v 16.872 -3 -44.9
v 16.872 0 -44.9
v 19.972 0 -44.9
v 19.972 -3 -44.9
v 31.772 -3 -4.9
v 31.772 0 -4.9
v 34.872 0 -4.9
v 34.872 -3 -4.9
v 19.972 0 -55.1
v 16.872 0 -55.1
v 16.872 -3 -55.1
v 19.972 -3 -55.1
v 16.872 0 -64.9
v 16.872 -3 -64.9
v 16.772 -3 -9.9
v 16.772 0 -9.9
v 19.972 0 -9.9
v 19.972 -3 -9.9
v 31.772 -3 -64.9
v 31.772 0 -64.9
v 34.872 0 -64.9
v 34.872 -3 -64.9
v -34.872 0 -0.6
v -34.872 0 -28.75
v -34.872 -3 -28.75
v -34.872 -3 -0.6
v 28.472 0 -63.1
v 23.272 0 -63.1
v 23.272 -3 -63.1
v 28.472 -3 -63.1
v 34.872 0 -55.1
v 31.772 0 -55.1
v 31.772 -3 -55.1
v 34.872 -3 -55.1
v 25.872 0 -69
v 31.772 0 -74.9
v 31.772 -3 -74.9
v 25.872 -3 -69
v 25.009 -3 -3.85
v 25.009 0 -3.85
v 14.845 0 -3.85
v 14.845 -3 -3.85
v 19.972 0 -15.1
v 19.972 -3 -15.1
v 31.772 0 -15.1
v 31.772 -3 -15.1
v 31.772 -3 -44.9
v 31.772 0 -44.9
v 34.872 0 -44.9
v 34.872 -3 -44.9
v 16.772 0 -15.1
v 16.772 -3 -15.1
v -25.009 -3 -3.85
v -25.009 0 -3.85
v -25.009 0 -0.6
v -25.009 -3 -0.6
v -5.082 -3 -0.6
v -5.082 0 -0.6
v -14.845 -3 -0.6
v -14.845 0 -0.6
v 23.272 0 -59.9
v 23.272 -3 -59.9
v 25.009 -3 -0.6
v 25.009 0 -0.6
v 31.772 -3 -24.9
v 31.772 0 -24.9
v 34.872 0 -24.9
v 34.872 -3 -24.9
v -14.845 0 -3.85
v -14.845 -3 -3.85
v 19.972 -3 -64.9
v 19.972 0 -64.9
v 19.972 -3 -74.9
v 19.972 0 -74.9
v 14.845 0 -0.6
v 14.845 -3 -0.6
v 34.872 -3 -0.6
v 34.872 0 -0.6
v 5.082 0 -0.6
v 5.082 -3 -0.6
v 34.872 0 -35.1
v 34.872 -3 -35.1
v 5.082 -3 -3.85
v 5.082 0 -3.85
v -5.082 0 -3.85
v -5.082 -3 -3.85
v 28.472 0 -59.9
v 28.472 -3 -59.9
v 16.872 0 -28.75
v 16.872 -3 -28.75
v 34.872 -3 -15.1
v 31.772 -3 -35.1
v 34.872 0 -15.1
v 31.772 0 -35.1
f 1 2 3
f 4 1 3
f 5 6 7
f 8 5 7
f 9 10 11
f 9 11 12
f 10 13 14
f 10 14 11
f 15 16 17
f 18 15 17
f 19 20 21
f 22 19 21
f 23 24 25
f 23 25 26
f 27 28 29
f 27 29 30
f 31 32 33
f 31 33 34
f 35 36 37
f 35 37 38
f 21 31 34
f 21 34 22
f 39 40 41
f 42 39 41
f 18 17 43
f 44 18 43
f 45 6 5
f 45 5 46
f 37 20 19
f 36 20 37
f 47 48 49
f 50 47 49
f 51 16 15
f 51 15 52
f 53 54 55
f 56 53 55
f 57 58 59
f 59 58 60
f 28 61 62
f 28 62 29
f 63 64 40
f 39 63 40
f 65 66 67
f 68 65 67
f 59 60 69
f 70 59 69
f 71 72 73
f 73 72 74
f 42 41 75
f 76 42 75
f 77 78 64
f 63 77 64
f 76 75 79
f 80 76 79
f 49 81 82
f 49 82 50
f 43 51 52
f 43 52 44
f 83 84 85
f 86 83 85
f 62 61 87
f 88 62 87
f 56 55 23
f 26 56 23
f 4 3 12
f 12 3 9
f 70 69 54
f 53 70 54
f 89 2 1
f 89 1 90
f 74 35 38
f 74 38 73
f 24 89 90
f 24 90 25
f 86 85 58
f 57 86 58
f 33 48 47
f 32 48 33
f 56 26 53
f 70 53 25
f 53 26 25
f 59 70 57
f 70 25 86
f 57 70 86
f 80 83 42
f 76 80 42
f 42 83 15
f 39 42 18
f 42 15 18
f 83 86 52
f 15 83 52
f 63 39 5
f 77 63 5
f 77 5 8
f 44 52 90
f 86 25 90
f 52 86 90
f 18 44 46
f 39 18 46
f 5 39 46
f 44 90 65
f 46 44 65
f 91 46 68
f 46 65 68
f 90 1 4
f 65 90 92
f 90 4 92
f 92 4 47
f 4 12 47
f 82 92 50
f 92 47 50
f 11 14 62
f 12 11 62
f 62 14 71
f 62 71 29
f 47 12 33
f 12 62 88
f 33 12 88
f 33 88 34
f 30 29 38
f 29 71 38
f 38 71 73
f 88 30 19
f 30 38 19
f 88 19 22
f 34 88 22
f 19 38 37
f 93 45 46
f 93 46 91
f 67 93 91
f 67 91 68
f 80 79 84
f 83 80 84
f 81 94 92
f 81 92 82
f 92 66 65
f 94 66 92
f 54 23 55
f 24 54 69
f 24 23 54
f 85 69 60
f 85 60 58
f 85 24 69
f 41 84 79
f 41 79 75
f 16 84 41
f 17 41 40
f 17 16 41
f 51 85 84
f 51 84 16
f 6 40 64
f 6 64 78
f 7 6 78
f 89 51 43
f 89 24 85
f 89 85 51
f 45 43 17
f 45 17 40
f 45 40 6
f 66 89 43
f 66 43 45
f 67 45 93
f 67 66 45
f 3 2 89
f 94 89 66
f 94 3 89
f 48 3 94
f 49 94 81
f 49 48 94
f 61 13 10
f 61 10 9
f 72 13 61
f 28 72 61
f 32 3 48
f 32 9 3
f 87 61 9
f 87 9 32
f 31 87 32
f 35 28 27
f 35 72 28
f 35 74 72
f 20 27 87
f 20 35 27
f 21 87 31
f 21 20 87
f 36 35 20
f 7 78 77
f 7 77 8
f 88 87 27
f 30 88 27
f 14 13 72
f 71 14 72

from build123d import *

# Parameters (mm, degrees)
BOSS_EXTRUDE1_DEPTH = 3
SKETCH8_W           = 3.2
SKETCH8_H           = 10.2
SKETCH8_W_2         = 5.2
SKETCH8_H_2         = 3.2
SKETCH8_H_3         = 5.2
CUT_EXTRUDE4_DEPTH  = 4
CUT_EXTRUDE2_DEPTH  = 4


with BuildPart() as part:
    # Sketch1 → Boss-Extrude1 (new body)
    with BuildSketch(Plane(origin=(0, 0, 0), x_dir=(1, 0, 0), z_dir=(0, 1, 0))):
        Polygon((-34.872217102, 0), (34.872217102, 0), (34.872217102, 75), (16.872217102, 75), (16.872217102, 28.75), (-34.872217102, 28.75), align=None)
    extrude(amount=-BOSS_EXTRUDE1_DEPTH)

    # Sketch8 → Cut-Extrude4 (cut, through all)
    with BuildSketch(Plane(origin=(0, 0, 0), x_dir=(1, 0, 0), z_dir=(0, 1, 0))):
        with Locations((33.372217102, 50)):
            Rectangle(SKETCH8_W, SKETCH8_H)
        with Locations((33.372217102, 70)):
            Rectangle(SKETCH8_W, SKETCH8_H)
        with Locations((25.872217102, 61.5)):
            Rectangle(SKETCH8_W_2, SKETCH8_H_2)
        with Locations((33.372217102, 10)):
            Rectangle(SKETCH8_W, SKETCH8_H)
        with Locations((33.372217102, 30)):
            Rectangle(SKETCH8_W, SKETCH8_H)
        with Locations((18.372217102, 12.5)):
            Rectangle(SKETCH8_W, SKETCH8_H_3)
        with Locations((18.372217102, 70)):
            Rectangle(SKETCH8_W, SKETCH8_H)
        Polygon((-34.972217102, 0.6), (-34.972217102, -0.1), (34.972217102, -0.1), (34.972217102, 0.6), (25.008726501, 0.6), (25.008726501, 3.85), (14.845235901, 3.85), (14.845235901, 0.6), (5.0817453, 0.6), (5.0817453, 3.85), (-5.0817453, 3.85), (-5.0817453, 0.6), (-14.845235901, 0.6), (-14.845235901, 3.85), (-25.008726501, 3.85), (-25.008726501, 0.6), align=None)
        with Locations((18.372217102, 50)):
            Rectangle(SKETCH8_W, SKETCH8_H)
    extrude(amount=-CUT_EXTRUDE4_DEPTH, mode=Mode.SUBTRACT)

    # Sketch5 → Cut-Extrude2 (cut, through all)
    with BuildSketch(Plane(origin=(0, 0, 0), x_dir=(1, 0, 0), z_dir=(0, 1, 0))):
        Polygon((31.872217102, 75), (25.872217102, 69), (19.872217102, 75), align=None)
    extrude(amount=-CUT_EXTRUDE2_DEPTH, mode=Mode.SUBTRACT)


solid = part.part
